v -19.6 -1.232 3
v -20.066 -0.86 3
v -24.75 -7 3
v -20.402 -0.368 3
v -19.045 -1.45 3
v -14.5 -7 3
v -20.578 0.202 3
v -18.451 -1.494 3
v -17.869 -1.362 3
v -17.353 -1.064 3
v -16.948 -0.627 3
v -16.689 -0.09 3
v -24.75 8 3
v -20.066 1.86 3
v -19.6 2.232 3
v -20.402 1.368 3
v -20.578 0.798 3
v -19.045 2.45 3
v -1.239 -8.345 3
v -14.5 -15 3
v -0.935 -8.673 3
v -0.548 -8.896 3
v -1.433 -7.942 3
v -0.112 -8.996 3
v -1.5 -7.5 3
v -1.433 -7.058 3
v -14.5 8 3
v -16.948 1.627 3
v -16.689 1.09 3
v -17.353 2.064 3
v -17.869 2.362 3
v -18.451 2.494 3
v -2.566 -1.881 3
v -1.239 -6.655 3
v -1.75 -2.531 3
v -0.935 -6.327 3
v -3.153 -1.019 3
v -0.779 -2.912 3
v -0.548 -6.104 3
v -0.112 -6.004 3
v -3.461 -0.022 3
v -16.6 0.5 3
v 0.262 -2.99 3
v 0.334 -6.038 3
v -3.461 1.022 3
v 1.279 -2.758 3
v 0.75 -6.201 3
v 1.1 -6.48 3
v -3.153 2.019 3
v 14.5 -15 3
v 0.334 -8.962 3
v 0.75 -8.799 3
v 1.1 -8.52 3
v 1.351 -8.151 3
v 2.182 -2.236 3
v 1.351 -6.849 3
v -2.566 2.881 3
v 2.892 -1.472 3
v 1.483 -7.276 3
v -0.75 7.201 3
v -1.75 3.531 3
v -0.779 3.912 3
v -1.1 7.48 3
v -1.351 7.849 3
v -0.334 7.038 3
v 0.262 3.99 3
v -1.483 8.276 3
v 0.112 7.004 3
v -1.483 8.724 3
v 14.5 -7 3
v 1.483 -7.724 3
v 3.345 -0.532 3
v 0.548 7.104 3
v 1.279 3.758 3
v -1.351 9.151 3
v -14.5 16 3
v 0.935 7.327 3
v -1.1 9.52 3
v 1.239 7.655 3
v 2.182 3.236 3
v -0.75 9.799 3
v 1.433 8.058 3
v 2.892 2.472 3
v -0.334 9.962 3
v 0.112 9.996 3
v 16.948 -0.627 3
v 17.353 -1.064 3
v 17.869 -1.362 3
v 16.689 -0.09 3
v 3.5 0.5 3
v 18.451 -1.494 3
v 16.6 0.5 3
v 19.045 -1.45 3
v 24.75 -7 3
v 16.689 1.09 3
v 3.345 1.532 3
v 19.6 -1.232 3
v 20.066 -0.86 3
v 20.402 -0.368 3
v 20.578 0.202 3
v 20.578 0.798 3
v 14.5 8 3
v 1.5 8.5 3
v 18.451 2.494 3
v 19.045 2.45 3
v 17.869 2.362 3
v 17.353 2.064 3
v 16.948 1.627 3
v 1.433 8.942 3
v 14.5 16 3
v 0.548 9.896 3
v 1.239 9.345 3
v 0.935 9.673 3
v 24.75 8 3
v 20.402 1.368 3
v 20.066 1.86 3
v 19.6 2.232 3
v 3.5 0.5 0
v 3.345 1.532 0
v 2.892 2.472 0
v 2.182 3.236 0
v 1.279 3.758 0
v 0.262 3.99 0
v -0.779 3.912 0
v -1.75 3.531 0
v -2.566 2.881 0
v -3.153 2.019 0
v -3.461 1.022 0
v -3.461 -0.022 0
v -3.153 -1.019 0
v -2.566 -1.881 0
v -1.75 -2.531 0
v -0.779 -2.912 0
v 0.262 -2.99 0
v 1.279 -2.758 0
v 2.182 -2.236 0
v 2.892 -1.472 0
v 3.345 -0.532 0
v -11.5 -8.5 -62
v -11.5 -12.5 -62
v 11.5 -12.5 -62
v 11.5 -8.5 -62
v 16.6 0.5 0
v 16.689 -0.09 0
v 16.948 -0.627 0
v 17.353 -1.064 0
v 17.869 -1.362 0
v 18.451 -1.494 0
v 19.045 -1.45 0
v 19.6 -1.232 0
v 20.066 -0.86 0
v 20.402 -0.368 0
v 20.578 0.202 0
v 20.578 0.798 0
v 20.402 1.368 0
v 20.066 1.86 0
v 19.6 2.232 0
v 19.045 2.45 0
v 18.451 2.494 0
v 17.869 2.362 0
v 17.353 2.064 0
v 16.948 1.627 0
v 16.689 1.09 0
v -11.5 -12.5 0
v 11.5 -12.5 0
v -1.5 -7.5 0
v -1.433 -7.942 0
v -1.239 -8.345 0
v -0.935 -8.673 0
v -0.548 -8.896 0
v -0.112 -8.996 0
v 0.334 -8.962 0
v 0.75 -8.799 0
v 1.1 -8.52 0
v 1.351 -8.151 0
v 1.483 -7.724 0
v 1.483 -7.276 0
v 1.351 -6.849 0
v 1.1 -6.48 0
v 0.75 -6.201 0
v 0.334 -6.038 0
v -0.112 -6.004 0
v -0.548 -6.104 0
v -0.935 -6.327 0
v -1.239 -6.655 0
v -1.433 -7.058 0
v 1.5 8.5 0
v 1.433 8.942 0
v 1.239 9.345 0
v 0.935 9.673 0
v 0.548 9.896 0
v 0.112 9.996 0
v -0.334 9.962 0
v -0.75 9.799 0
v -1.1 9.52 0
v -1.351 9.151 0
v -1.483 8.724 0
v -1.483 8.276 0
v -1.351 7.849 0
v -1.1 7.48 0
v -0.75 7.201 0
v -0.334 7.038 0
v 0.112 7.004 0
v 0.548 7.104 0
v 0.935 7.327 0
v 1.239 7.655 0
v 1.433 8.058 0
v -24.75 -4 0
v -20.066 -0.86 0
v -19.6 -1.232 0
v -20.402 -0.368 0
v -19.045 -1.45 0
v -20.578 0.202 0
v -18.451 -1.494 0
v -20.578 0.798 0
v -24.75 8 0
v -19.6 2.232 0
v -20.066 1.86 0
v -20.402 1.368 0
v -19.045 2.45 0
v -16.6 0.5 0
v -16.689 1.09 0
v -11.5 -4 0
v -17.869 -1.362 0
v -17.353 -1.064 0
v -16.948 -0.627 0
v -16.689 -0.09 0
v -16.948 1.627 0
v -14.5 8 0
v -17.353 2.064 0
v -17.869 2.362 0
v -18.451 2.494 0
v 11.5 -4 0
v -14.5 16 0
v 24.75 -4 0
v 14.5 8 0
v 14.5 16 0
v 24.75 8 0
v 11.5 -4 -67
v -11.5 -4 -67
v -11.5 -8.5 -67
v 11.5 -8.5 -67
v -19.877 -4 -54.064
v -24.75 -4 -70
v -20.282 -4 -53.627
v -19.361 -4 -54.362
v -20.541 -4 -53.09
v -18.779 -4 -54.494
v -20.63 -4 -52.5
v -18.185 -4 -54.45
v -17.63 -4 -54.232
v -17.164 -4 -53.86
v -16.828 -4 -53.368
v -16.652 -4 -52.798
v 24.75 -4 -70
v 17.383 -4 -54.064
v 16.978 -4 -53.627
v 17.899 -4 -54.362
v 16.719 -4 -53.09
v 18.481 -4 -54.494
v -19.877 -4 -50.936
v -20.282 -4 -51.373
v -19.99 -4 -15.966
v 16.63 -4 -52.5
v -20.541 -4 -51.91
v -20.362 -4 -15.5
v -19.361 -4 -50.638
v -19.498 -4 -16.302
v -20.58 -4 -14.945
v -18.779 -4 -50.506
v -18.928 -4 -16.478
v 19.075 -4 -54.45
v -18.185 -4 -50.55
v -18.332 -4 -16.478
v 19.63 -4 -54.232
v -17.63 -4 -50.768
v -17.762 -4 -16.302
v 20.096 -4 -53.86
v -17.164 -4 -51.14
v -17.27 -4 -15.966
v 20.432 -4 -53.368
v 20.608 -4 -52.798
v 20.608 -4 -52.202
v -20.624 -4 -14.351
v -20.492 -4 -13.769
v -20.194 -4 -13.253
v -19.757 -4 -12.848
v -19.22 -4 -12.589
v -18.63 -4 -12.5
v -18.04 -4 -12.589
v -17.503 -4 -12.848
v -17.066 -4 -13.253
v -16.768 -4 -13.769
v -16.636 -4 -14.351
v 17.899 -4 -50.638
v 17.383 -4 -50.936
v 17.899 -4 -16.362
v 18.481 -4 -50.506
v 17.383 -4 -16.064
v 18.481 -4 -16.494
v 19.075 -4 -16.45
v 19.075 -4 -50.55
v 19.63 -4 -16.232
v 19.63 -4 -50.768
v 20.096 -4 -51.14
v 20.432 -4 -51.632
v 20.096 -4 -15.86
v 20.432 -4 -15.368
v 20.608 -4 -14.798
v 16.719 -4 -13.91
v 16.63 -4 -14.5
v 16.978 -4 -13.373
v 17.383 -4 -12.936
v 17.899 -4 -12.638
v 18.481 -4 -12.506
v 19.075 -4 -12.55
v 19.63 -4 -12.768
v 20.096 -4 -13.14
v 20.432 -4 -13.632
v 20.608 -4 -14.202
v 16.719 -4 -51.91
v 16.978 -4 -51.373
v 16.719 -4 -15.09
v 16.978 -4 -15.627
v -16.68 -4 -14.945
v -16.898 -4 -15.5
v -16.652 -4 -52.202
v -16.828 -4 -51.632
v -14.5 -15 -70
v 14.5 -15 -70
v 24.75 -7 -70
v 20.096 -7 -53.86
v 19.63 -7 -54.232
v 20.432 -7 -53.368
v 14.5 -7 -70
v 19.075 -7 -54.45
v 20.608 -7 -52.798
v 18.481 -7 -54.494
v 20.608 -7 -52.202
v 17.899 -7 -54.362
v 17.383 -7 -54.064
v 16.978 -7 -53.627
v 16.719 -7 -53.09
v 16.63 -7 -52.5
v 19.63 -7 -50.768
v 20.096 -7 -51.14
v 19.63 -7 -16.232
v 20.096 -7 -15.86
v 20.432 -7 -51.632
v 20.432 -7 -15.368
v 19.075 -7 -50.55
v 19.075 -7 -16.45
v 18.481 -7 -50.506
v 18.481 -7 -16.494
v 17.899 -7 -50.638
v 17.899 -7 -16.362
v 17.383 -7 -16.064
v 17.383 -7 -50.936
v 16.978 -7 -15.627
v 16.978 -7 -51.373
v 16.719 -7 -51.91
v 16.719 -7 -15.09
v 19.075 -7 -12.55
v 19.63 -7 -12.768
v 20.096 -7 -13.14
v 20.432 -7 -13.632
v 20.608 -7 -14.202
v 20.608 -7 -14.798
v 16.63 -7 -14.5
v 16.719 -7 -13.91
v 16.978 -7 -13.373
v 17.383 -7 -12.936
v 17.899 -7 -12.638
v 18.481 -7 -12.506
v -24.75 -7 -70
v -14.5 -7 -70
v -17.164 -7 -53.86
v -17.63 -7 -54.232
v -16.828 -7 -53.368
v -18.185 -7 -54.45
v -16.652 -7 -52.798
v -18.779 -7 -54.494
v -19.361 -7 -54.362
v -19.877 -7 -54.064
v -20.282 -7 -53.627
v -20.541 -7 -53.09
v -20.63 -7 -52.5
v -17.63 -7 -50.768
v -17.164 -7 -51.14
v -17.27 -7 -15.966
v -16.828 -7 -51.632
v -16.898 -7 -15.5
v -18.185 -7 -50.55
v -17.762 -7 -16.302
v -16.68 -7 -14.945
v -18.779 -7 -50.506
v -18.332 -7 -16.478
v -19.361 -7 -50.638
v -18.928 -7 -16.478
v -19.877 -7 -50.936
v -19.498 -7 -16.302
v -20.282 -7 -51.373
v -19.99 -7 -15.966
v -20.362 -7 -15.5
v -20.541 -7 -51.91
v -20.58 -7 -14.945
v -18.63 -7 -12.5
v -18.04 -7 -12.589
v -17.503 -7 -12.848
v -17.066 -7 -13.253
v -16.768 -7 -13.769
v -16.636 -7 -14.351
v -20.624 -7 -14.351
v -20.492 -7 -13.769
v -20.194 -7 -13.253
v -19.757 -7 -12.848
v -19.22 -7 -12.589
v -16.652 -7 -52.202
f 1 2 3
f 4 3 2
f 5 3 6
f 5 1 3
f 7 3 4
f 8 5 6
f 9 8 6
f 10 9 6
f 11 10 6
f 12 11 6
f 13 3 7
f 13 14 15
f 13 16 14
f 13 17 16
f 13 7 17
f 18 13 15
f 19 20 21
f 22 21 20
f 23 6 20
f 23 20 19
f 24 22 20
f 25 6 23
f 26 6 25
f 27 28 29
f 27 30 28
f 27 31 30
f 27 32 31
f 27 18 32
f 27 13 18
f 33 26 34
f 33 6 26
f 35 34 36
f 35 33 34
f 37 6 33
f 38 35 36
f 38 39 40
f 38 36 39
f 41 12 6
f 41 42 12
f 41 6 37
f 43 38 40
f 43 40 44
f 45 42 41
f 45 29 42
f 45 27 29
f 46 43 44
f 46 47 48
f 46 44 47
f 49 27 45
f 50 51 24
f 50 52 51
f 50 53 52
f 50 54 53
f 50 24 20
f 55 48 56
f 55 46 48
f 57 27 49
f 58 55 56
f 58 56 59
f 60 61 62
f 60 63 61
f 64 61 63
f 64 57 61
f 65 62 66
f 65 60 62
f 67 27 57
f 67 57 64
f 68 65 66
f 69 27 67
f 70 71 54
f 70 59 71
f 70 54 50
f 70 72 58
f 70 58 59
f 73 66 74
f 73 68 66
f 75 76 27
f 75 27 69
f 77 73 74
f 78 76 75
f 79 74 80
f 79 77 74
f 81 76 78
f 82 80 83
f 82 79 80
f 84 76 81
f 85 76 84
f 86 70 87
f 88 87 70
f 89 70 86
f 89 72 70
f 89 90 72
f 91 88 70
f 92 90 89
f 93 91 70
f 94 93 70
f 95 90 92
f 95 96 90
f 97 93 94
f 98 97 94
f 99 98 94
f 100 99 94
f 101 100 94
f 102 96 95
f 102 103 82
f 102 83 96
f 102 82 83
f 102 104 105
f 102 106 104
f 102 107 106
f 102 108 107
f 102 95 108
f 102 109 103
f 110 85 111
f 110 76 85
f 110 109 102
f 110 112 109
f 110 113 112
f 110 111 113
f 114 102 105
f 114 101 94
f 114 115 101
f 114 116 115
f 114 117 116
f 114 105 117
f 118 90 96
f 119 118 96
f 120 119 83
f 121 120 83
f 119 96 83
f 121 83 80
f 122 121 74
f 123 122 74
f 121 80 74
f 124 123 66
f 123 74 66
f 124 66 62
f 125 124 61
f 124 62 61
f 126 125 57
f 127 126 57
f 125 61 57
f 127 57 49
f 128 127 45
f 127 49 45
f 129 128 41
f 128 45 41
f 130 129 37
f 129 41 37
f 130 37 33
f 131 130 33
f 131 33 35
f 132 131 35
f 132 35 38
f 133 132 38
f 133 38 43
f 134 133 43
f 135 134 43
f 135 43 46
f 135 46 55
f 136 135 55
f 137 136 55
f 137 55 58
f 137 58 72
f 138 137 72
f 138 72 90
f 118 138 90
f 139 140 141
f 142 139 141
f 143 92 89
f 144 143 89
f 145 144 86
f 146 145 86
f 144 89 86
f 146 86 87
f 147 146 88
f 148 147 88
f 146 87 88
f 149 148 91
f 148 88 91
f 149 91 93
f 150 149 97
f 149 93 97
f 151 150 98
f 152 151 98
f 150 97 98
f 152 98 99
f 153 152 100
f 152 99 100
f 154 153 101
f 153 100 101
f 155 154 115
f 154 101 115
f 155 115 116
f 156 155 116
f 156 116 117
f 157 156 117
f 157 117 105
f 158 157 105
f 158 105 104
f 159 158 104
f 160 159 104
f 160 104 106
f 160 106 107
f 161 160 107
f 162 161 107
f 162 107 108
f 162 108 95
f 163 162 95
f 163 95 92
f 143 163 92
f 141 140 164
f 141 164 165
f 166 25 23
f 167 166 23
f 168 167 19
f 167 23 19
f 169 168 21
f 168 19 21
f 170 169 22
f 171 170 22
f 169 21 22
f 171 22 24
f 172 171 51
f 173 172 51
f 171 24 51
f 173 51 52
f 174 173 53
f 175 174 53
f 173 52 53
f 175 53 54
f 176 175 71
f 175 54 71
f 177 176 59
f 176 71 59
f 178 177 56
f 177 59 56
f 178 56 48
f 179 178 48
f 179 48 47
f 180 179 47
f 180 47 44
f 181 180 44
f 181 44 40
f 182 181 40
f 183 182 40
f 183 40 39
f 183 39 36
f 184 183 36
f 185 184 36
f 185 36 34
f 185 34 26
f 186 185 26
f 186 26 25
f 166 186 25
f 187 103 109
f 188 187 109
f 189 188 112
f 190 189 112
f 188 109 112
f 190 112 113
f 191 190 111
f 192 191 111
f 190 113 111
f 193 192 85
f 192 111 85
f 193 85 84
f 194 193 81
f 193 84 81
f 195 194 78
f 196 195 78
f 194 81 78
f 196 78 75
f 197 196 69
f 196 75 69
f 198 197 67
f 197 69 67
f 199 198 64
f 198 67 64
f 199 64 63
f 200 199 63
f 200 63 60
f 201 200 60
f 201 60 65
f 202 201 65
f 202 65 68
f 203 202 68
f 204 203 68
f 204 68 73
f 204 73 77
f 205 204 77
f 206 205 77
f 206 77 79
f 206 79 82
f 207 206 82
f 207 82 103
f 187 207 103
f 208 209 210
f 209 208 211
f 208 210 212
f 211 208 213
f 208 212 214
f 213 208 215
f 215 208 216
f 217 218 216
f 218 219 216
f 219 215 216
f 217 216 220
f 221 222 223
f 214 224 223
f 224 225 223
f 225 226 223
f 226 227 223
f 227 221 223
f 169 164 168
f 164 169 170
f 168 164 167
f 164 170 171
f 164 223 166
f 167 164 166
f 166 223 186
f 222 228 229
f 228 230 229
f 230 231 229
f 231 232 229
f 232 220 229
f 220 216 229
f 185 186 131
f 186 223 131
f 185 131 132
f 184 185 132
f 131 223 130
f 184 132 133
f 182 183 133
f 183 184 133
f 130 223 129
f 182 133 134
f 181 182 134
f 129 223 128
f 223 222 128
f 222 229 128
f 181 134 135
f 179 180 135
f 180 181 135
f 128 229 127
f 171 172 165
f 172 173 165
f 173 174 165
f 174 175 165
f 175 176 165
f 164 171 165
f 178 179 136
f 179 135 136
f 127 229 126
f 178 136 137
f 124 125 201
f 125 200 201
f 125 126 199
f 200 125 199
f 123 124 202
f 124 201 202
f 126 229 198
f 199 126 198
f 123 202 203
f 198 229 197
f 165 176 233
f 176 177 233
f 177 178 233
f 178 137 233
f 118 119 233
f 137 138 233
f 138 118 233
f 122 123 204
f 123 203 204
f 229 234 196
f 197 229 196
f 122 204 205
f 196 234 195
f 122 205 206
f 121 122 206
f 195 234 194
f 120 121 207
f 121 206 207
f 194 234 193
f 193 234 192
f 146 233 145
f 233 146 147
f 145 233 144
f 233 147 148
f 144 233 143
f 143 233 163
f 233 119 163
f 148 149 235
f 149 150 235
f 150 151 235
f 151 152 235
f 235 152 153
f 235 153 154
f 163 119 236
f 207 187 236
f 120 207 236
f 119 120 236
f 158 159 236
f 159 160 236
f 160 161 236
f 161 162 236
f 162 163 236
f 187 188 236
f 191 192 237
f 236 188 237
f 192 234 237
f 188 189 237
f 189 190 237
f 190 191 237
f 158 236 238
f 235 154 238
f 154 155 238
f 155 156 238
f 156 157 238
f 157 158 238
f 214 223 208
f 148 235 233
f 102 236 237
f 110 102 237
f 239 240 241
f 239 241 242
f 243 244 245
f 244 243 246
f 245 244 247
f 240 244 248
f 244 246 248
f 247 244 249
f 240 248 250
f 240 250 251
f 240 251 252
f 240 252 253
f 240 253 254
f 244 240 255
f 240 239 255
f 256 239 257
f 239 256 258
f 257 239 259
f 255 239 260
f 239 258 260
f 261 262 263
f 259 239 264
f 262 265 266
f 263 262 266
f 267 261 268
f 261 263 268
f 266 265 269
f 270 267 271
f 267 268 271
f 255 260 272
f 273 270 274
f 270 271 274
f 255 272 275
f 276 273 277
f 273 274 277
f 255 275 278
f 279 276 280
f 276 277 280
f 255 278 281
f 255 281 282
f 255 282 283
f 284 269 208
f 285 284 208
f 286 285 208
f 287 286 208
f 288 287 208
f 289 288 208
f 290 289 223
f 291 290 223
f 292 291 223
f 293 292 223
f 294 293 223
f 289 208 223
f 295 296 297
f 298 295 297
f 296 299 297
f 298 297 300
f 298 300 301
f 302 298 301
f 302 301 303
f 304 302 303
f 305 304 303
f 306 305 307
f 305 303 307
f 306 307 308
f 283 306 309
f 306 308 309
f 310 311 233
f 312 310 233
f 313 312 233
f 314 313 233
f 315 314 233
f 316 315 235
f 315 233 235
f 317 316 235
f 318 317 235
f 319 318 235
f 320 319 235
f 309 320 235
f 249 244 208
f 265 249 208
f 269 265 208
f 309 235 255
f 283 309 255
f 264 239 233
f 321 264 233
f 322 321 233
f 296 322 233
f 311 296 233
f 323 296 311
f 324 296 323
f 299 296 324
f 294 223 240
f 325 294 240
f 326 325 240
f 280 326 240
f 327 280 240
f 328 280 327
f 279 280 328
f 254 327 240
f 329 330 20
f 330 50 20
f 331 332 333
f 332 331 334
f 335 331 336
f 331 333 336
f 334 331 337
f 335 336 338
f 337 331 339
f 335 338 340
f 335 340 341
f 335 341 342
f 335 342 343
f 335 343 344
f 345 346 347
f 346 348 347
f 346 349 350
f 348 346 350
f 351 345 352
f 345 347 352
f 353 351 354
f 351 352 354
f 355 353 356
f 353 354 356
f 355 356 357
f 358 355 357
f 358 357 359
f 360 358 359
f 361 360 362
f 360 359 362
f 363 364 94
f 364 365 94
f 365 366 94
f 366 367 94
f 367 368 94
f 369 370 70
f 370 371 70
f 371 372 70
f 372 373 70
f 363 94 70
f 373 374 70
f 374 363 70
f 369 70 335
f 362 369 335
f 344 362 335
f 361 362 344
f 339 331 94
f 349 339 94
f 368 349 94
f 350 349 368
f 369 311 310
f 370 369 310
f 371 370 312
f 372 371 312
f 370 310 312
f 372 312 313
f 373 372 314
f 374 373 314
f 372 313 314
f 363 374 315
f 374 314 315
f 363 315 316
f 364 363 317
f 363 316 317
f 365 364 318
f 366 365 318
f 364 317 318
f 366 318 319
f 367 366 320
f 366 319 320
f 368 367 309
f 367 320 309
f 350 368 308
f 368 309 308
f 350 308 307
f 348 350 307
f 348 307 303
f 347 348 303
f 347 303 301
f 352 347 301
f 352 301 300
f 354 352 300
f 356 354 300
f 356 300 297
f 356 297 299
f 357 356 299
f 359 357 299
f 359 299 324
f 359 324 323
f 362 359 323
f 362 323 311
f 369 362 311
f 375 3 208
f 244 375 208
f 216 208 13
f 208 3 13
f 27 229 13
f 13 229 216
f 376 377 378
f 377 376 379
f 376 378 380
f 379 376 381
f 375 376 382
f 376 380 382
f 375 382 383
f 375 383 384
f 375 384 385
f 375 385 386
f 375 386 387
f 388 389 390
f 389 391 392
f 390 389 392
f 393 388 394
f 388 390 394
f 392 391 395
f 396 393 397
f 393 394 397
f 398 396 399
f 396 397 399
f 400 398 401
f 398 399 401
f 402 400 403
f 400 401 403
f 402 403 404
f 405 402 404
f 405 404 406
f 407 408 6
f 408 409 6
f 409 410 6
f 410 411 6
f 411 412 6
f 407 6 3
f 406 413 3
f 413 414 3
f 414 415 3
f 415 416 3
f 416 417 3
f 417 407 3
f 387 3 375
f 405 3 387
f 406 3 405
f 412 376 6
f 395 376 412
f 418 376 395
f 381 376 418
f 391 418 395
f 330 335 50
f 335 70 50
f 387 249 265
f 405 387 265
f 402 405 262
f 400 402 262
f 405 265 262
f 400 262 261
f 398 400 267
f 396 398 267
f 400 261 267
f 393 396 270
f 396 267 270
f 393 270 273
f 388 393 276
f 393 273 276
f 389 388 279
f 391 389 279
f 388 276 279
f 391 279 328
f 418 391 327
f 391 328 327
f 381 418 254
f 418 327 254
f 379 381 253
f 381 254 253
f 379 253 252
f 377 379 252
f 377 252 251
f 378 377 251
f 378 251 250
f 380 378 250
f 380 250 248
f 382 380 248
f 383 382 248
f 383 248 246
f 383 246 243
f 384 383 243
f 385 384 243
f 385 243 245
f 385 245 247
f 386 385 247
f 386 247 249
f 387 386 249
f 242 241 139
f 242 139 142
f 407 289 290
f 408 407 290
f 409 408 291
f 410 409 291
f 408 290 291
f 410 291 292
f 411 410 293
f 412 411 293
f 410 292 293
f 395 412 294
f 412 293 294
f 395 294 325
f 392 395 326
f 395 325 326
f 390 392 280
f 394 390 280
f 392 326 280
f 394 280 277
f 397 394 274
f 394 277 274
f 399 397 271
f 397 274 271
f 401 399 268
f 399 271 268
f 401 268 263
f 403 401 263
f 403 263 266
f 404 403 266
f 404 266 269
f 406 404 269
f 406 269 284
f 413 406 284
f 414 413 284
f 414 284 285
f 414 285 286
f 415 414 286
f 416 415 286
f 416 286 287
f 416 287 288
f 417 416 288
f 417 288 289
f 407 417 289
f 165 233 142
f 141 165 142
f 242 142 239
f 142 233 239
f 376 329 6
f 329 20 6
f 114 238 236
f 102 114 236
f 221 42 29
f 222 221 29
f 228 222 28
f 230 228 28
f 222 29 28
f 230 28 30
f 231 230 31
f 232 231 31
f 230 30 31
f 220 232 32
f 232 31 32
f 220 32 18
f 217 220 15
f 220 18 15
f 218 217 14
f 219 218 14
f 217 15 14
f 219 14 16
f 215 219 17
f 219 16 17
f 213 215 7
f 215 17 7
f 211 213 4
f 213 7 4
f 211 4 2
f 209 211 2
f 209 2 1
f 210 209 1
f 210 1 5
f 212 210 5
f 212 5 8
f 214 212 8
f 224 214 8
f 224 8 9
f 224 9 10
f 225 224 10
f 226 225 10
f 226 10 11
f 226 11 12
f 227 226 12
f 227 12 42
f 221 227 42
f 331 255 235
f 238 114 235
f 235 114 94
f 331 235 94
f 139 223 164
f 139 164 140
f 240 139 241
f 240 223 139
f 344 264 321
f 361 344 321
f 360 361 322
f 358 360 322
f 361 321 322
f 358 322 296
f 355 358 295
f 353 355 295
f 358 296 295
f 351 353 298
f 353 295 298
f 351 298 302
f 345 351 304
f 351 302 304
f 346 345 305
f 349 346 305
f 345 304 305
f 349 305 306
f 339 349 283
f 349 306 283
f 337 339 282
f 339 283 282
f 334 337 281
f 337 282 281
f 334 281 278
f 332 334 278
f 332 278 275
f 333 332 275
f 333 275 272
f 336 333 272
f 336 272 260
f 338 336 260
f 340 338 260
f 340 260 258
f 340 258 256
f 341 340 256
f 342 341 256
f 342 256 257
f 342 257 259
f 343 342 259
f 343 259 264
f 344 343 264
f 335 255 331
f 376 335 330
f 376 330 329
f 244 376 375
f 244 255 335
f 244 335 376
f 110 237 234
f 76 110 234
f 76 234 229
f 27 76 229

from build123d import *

# Parameters (mm, degrees)
SALIENTE_EXTRUIR2_DEPTH = 3
SALIENTE_EXTRUIR3_DEPTH = 70
CROQUIS_HUECO_MOTOR_W   = 23
CROQUIS_HUECO_MOTOR_H   = 67
HUECO_MOTOR_DEPTH       = 8.5
CROQUIS10_R             = 3.5
CROQUIS10_R_2           = 2
CROQUIS10_R_3           = 1.5
TORNILLO_Y_MOTOR_DEPTH  = 5
CROQUIS12_W             = 23
CROQUIS12_H             = 5
SALIENTE_EXTRUIR5_DEPTH = 4
CROQUIS16_R             = 2
CORTAR_EXTRUIR4_DEPTH   = 77.893188905


with BuildPart() as part:
    # Croquis4 → Saliente-Extruir2 (new body)
    with BuildSketch(Plane.XY):
        Polygon((14.5, 16), (-14.5, 16), (-14.5, 8), (-24.75, 8), (-24.75, -7), (-14.5, -7), (-14.5, -15), (14.5, -15), (14.5, -7), (24.75, -7), (24.75, 8), (14.5, 8), align=None)
    extrude(amount=SALIENTE_EXTRUIR2_DEPTH)

    # Croquis5 → Saliente-Extruir3 (add)
    with BuildSketch(Plane(origin=(0, 0, 0), x_dir=(-1, 0, 0), z_dir=(0, 0, -1))):
        Polygon((-24.75, -4), (-24.75, -7), (-14.5, -7), (-14.5, -15), (14.5, -15), (14.5, -7), (24.75, -7), (24.75, -4), align=None)
    extrude(amount=SALIENTE_EXTRUIR3_DEPTH)

    # croquis hueco motor → hueco motor (cut)
    with BuildSketch(Plane(origin=(0, -4, 0), x_dir=(1, 0, 0), z_dir=(0, 1, 0))):
        with Locations((0, 33.5)):
            Rectangle(CROQUIS_HUECO_MOTOR_W, CROQUIS_HUECO_MOTOR_H)
    extrude(amount=-HUECO_MOTOR_DEPTH, mode=Mode.SUBTRACT)

    # Croquis10 → tornillo y motor (cut)
    with BuildSketch(Plane.XY.offset(3)):
        with Locations((0, 0.5)):
            Circle(CROQUIS10_R)
        with Locations((-18.6, 0.5)):
            Circle(CROQUIS10_R_2)
        with Locations(Location((18.6, 0.5, 0), (0, 0, 180))):
            Circle(CROQUIS10_R_2)
        with Locations((0, 8.5)):
            Circle(CROQUIS10_R_3)
        with Locations(Location((0, -7.5, 0), (0, 0, 180))):
            Circle(CROQUIS10_R_3)
    extrude(amount=-TORNILLO_Y_MOTOR_DEPTH, mode=Mode.SUBTRACT)

    # Croquis12 → Saliente-Extruir5 (add)
    with BuildSketch(Plane(origin=(0, -12.5, 0), x_dir=(1, 0, 0), z_dir=(0, 1, 0))):
        with Locations((0, 64.5)):
            Rectangle(CROQUIS12_W, CROQUIS12_H)
    extrude(amount=SALIENTE_EXTRUIR5_DEPTH)

    # Croquis16 → Cortar-Extruir4 (cut, through all)
    with BuildSketch(Plane(origin=(0, -4, 0), x_dir=(1, 0, 0), z_dir=(0, 1, 0))):
        with Locations(Location((-18.63, 52.5, 0), (0, 0, 180))):
            Circle(CROQUIS16_R)
        with Locations(Location((-18.63, 14.5, 0), (0, 0, 270))):
            Circle(CROQUIS16_R)
        with Locations(Location((18.63, 14.5, 0), (0, 0, 180))):
            Circle(CROQUIS16_R)
        with Locations(Location((18.63, 52.5, 0), (0, 0, 180))):
            Circle(CROQUIS16_R)
    extrude(amount=-CORTAR_EXTRUIR4_DEPTH, mode=Mode.SUBTRACT)


solid = part.part
